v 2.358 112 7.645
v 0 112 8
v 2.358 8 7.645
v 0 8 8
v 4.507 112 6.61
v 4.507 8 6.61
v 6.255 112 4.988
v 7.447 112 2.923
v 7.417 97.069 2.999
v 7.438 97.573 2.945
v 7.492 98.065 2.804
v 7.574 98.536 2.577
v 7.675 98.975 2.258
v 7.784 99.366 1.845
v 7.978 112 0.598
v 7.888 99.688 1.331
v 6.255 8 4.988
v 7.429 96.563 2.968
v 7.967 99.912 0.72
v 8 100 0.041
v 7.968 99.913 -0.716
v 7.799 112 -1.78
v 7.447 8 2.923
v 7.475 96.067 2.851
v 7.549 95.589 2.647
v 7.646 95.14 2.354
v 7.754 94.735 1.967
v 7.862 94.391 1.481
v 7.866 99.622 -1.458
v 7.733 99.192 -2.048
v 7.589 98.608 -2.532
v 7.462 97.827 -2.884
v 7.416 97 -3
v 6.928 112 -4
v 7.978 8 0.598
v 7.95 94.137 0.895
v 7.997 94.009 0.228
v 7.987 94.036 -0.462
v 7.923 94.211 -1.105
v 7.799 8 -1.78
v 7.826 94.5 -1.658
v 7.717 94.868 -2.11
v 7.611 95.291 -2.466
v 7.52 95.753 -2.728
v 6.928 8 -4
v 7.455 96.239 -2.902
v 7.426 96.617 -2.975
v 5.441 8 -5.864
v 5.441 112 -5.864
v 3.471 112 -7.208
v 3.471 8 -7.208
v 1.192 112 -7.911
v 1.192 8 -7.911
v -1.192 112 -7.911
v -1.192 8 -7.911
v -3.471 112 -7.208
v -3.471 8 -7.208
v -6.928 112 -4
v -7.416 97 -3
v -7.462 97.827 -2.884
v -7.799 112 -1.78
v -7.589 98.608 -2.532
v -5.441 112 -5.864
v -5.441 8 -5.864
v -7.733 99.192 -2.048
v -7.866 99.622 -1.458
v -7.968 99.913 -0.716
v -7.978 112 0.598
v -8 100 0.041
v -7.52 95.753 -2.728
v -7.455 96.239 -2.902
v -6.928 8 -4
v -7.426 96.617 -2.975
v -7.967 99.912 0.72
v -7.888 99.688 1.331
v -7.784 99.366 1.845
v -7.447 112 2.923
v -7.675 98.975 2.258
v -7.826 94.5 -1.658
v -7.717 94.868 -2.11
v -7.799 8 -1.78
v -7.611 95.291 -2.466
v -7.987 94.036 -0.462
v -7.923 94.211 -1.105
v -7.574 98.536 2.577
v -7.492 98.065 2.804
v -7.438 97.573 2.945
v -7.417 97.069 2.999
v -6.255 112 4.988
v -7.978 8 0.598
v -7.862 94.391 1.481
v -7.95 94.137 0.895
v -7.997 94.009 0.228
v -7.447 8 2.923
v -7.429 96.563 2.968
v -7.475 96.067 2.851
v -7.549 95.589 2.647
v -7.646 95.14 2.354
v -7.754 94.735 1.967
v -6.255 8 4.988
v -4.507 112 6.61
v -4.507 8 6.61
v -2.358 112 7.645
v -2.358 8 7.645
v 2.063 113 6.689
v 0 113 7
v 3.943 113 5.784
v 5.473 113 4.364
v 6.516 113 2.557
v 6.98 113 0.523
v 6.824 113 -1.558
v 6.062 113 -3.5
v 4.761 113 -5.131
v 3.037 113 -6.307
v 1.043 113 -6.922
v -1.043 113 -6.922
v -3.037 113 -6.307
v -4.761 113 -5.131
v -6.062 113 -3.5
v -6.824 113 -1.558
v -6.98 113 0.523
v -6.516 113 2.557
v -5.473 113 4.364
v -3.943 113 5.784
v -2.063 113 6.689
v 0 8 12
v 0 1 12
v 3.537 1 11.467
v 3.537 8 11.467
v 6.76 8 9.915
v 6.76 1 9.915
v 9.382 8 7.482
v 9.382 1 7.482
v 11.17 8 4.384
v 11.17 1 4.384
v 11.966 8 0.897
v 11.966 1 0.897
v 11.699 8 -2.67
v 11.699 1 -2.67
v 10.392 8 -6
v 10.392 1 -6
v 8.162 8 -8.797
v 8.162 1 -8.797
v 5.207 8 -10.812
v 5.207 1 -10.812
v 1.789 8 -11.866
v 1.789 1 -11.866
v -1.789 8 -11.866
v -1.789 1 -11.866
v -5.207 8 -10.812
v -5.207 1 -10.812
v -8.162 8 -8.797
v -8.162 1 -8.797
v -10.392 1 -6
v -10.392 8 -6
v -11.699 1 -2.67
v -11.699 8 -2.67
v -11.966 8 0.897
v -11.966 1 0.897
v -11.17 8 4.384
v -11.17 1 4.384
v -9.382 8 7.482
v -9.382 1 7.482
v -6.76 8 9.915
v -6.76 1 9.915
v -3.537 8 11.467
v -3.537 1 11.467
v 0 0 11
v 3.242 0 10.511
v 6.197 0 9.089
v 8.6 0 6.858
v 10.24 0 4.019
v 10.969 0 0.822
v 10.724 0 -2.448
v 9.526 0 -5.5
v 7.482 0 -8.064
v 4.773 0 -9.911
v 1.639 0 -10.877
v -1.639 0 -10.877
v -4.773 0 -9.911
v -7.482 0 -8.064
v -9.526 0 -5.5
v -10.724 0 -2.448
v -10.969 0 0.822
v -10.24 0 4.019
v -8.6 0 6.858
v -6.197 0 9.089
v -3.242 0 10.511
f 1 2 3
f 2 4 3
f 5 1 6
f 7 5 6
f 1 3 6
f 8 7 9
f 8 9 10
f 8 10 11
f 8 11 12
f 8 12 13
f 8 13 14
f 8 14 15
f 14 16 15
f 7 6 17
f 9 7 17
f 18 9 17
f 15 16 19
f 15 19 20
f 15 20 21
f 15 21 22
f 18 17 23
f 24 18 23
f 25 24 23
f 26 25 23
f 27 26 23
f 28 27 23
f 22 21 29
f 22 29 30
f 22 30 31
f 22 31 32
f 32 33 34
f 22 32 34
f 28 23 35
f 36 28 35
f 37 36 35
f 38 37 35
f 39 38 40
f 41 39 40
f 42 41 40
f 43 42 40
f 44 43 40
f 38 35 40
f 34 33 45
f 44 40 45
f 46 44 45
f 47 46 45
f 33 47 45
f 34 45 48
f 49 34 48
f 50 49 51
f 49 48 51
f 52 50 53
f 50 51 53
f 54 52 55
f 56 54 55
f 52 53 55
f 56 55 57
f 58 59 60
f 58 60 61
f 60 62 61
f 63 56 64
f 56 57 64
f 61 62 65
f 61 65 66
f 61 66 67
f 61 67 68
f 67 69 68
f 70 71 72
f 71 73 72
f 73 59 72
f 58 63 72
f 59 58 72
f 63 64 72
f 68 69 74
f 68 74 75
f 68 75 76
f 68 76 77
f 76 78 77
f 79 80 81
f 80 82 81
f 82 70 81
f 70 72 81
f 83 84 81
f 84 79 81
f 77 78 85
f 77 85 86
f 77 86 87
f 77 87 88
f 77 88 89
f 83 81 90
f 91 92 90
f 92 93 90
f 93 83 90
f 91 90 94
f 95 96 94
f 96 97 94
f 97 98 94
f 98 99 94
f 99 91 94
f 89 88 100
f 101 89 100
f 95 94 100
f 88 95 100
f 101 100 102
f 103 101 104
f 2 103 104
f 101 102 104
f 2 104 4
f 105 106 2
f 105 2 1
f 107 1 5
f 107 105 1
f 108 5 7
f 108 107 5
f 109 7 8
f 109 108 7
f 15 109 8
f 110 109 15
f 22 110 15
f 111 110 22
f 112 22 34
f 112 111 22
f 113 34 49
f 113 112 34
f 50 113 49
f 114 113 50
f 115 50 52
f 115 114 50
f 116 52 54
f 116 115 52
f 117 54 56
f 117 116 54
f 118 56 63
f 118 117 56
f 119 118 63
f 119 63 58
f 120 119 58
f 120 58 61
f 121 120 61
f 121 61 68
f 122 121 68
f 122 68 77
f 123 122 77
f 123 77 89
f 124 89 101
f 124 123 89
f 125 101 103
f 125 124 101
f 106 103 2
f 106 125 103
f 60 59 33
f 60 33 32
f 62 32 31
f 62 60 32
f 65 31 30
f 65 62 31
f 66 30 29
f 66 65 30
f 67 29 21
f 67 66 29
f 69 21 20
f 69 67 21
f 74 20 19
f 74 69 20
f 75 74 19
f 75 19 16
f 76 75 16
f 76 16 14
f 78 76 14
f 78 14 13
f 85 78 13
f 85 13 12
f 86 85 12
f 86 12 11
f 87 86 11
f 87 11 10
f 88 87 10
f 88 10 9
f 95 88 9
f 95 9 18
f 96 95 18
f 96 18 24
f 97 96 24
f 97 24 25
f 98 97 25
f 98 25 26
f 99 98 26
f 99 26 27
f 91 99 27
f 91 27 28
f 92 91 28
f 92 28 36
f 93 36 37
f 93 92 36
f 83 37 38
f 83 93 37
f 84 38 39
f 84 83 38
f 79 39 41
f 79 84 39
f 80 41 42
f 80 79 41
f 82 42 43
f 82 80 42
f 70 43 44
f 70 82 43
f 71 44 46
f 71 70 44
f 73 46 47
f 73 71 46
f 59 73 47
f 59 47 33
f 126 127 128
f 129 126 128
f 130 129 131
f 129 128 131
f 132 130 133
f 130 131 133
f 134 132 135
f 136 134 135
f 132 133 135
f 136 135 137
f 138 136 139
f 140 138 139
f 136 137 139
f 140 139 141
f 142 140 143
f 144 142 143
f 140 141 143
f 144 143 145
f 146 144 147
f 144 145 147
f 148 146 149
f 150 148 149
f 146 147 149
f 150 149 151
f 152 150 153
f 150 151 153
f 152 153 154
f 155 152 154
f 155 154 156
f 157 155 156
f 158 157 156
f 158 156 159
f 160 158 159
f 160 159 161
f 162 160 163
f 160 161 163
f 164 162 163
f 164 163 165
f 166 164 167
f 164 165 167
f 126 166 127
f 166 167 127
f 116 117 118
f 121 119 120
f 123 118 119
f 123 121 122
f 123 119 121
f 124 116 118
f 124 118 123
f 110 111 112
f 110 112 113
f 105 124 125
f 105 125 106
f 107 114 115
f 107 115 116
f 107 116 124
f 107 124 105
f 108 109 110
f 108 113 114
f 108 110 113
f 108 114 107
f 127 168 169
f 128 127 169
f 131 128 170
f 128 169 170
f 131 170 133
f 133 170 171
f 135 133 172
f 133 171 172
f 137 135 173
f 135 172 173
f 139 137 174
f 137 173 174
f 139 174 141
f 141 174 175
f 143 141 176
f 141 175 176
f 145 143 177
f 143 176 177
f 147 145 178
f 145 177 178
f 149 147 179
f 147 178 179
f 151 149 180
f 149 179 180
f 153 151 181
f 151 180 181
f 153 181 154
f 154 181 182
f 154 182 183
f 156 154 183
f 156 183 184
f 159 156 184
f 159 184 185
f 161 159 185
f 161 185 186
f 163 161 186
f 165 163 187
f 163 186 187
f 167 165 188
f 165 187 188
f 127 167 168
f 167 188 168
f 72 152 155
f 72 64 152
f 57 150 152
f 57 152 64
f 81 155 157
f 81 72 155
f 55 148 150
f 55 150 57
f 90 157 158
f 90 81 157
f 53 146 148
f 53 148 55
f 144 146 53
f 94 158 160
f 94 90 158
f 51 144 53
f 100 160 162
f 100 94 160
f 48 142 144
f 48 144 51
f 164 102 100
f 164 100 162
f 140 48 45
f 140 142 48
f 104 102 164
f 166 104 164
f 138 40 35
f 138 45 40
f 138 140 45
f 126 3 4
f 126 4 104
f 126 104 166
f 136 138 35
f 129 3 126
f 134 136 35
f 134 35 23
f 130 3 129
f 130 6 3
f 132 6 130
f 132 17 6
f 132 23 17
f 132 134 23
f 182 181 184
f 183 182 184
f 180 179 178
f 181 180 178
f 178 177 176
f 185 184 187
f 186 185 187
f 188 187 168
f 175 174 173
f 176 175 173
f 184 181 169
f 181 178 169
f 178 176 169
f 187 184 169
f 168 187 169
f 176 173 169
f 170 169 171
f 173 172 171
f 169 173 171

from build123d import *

# Parameters (mm, degrees)
SKETCH1_R               = 12
BOSS_EXTRUDE1_DEPTH     = 8
CHAMFER1_SIZE           = 1
SKETCH2_R               = 8
BOSS_EXTRUDE2_DEPTH     = 105
CHAMFER2_SIZE           = 1
CUT_EXTRUDE1_DEPTH      = 115.267230648
CUT_EXTRUDE1_DEPTH_BACK = 115.267230648
SKETCH3_R               = 3


with BuildPart() as part:
    # Sketch1 → Boss-Extrude1 (new body)
    with BuildSketch(Plane(origin=(0, 0, 0), x_dir=(-1, 0, 0), z_dir=(0, 1, 0))):
        with Locations(Location((0, 0, 0), (0, 0, 90))):
            Circle(SKETCH1_R)
    extrude(amount=BOSS_EXTRUDE1_DEPTH)

    # Chamfer1
    chamfer1_edges = [part.edges().sort_by_distance(p)[0] for p in [
        (0, 0, -12),
    ]]
    chamfer(chamfer1_edges, length=CHAMFER1_SIZE)

    # Sketch2 → Boss-Extrude2 (add)
    with BuildSketch(Plane(origin=(0, 8, 0), x_dir=(-1, 0, 0), z_dir=(0, 1, 0))):
        with Locations(Location((0, 0, 0), (0, 0, 90))):
            Circle(SKETCH2_R)
    extrude(amount=BOSS_EXTRUDE2_DEPTH)

    # Chamfer2
    chamfer2_edges = [part.edges().sort_by_distance(p)[0] for p in [
        (0, 113, -8),
    ]]
    chamfer(chamfer2_edges, length=CHAMFER2_SIZE)

    # Sketch3 → Cut-Extrude1 (cut, two sides: drawn at the far end of the back side and taken through both)
    with BuildSketch(Plane.YZ.offset(-CUT_EXTRUDE1_DEPTH_BACK)):
        with Locations(Location((97, 0, 0), (0, 0, 270))):
            Circle(SKETCH3_R)
    extrude(amount=CUT_EXTRUDE1_DEPTH + CUT_EXTRUDE1_DEPTH_BACK, mode=Mode.SUBTRACT)


solid = part.part
